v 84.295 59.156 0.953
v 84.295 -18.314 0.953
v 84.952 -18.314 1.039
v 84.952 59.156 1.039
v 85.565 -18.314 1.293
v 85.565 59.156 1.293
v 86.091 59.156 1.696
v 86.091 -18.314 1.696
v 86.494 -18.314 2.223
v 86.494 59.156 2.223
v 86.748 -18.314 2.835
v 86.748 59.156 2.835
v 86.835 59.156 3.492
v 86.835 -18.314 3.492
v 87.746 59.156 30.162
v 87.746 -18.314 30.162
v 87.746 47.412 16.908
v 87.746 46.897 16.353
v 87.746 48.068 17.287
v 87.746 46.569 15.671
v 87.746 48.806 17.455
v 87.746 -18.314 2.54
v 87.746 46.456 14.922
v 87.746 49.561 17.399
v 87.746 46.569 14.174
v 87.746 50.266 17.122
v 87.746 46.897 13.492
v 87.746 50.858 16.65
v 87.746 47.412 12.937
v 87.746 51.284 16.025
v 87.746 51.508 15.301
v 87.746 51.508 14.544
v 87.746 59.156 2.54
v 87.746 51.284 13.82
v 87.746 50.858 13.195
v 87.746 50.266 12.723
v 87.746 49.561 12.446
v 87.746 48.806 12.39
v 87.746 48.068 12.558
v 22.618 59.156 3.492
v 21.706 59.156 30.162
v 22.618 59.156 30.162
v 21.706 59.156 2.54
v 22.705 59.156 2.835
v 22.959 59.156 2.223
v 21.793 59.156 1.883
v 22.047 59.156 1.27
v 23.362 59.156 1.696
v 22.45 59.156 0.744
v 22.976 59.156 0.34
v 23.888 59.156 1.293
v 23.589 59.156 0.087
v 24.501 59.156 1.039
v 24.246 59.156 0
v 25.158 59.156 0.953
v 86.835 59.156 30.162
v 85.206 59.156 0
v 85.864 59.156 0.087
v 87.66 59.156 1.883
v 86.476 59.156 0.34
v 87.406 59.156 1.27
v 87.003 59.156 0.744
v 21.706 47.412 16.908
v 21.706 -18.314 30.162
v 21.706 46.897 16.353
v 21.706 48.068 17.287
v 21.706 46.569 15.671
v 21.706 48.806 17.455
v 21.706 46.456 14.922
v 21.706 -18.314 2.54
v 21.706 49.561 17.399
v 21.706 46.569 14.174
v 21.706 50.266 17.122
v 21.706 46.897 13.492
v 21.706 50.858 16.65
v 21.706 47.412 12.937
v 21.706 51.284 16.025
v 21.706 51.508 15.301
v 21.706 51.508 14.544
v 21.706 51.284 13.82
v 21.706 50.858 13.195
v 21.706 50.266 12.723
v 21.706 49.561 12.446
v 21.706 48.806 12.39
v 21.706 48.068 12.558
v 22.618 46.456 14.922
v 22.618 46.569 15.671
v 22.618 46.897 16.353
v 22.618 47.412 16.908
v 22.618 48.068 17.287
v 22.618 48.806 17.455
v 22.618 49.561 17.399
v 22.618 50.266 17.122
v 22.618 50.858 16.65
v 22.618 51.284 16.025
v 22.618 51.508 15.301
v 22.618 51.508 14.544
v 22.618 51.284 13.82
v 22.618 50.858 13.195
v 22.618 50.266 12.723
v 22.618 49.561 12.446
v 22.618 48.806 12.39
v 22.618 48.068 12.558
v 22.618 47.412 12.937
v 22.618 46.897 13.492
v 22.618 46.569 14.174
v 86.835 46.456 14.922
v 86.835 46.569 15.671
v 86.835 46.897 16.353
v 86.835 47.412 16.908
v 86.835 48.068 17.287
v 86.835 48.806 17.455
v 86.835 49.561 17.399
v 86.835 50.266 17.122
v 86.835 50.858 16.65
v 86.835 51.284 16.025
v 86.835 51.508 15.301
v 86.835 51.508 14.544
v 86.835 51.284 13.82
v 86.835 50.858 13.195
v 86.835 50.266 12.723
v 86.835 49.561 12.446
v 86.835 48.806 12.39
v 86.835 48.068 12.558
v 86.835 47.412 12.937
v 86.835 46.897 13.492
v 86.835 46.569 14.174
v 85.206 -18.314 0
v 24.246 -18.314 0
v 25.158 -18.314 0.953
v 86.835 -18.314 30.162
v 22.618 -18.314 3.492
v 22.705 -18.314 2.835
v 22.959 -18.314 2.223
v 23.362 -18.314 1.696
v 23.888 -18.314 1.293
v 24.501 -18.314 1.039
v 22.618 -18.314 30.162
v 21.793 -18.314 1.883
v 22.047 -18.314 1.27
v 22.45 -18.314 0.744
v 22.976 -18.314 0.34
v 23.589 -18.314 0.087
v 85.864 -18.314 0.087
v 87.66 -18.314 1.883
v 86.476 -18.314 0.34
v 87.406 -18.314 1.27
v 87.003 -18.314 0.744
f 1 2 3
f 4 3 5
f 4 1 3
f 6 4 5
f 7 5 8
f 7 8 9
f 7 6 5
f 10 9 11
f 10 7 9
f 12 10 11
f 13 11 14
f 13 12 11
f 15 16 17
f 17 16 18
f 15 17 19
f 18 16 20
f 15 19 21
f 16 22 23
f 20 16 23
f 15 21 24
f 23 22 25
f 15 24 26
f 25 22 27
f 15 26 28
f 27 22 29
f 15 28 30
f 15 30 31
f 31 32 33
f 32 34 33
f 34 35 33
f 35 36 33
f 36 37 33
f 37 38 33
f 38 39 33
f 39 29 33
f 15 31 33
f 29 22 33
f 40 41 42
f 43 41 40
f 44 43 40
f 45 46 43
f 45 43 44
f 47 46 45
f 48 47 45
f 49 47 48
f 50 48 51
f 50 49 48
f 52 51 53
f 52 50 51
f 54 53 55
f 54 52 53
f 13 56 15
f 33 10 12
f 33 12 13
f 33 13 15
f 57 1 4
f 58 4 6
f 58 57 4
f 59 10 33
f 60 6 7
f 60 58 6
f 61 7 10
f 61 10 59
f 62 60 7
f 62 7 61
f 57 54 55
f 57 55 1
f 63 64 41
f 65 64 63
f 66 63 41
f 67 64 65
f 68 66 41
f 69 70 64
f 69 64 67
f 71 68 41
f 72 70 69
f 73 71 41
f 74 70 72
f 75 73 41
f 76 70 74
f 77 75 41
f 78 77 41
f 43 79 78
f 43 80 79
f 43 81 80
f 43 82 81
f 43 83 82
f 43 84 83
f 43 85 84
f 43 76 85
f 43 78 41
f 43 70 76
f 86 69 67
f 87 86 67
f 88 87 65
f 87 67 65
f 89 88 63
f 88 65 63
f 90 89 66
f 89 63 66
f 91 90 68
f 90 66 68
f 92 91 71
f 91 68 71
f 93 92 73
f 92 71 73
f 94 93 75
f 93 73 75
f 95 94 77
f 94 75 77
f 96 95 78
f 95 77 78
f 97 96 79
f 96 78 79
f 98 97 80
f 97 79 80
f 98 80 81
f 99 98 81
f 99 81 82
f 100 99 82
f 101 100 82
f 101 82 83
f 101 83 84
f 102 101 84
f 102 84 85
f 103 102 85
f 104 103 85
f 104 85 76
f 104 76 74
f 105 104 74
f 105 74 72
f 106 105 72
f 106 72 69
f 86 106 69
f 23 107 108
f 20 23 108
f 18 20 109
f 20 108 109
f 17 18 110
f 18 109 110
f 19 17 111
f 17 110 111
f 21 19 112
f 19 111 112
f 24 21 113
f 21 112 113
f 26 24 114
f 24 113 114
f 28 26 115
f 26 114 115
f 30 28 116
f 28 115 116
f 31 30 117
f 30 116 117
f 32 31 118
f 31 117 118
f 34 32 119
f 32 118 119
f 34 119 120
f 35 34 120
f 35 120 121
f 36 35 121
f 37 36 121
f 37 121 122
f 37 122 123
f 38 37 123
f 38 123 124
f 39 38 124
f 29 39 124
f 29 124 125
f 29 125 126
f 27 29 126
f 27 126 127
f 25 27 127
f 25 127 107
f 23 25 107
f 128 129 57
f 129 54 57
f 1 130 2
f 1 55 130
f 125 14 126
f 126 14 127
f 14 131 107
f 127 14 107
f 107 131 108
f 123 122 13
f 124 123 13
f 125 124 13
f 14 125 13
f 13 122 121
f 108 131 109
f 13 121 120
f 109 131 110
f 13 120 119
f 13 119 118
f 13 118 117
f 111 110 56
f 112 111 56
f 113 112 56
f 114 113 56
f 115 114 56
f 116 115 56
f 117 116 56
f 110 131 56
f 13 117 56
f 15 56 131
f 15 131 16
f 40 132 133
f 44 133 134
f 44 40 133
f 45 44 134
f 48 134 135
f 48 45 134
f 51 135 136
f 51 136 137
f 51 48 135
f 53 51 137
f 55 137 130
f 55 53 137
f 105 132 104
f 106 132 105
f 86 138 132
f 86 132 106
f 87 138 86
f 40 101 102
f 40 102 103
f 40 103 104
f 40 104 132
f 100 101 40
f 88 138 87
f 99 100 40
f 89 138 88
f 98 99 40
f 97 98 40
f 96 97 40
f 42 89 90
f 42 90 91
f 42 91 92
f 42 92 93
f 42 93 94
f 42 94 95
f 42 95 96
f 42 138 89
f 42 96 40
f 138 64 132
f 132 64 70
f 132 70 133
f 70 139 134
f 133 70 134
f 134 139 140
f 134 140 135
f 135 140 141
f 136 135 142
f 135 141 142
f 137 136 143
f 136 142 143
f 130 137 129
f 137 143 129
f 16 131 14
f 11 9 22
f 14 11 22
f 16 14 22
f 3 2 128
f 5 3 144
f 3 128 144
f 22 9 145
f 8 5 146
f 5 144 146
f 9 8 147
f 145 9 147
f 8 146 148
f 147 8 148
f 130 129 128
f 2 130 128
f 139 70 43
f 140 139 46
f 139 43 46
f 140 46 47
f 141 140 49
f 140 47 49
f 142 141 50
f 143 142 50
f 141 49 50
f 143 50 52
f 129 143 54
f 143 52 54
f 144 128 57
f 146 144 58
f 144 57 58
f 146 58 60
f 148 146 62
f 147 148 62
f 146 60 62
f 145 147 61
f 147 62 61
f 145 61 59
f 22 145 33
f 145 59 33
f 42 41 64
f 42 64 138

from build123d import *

# Parameters (mm, degrees)
SKETCH1_W           = 66.04
SKETCH1_H           = 77.47
BOSS_EXTRUDE1_DEPTH = 30.1625
SKETCH2_W           = 64.21628
SKETCH2_H           = 77.47
CUT_EXTRUDE2_DEPTH  = 29.21
FILLET1_R           = 2.54
FILLET2_R           = 2.54
FILLET3_R           = 2.54
FILLET4_R           = 2.54
SKETCH5_R           = 2.54
CUT_EXTRUDE3_DEPTH  = 94.650885895


with BuildPart() as part:
    # Sketch1 → Boss-Extrude1 (new body)
    with BuildSketch(Plane.XY):
        with Locations((54.726493431, 20.420983827)):
            Rectangle(SKETCH1_W, SKETCH1_H)
    extrude(amount=BOSS_EXTRUDE1_DEPTH)

    # Sketch2 → Cut-Extrude2 (cut)
    with BuildSketch(Plane.XY.offset(30.1625)):
        with Locations((54.726493431, 20.420983827)):
            Rectangle(SKETCH2_W, SKETCH2_H)
    extrude(amount=-CUT_EXTRUDE2_DEPTH, mode=Mode.SUBTRACT)

    # Fillet1
    fillet1_edges = [part.edges().sort_by_distance(p)[0] for p in [
        (21.706493431, 20.420983827, 0),
    ]]
    fillet(fillet1_edges, radius=FILLET1_R)

    # Fillet2
    fillet2_edges = [part.edges().sort_by_distance(p)[0] for p in [
        (87.746493431, 20.420983827, 0),
    ]]
    fillet(fillet2_edges, radius=FILLET2_R)

    # Fillet3
    fillet3_edges = [part.edges().sort_by_distance(p)[0] for p in [
        (22.618353431, 20.420983827, 0.9525),
    ]]
    fillet(fillet3_edges, radius=FILLET3_R)

    # Fillet4
    fillet4_edges = [part.edges().sort_by_distance(p)[0] for p in [
        (86.834633431, 20.420983827, 0.9525),
    ]]
    fillet(fillet4_edges, radius=FILLET4_R)

    # Sketch5 → Cut-Extrude3 (cut, through all)
    with BuildSketch(Plane.ZY.offset(-21.706493431)):
        with Locations(Location((14.9225, 48.995983827, 0), (0, 0, 270))):
            Circle(SKETCH5_R)
    extrude(amount=-CUT_EXTRUDE3_DEPTH, mode=Mode.SUBTRACT)


solid = part.part
